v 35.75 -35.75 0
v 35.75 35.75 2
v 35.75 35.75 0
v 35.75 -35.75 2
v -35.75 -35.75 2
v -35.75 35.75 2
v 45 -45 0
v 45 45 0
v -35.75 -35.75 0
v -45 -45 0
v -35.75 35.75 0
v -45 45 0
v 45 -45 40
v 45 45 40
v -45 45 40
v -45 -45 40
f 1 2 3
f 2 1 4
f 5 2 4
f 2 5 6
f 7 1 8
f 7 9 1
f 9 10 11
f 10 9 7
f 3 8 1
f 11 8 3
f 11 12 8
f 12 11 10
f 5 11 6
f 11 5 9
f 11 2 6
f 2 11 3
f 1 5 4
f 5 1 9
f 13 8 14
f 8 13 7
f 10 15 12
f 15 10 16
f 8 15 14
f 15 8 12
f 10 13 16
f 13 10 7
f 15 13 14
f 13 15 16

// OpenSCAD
// Built by bench/smallmodels/features/compiler.py from a list of features.
$fn = 64;
difference() {
  union() {
    translate([0, 0, 0]) translate([-45, -45, 0]) cube([90, 90, 2]);
  }
  union() {
    translate([0, 0, 0]) rotate([0, 0, 0]) translate([-35.75, -35.75, 0]) cube([71.5, 71.5, 2]);
    translate([0, -177.5, 2]) rotate([0, 0, 0]) translate([-45, -1.25, 0]) cube([90, 2.5, 38]);
    translate([0, -87.5, 2]) rotate([0, 0, 0]) translate([-45, -1.25, 0]) cube([90, 2.5, 38]);
    translate([0, 2.5, 2]) rotate([0, 0, 0]) translate([-45, -1.25, 0]) cube([90, 2.5, 38]);
    translate([0, 92.5, 2]) rotate([0, 0, 0]) translate([-45, -1.25, 0]) cube([90, 2.5, 38]);
    translate([-177.5, 0, 2]) rotate([0, 0, 0]) translate([-1.25, -45, 0]) cube([2.5, 90, 38]);
    translate([-87.5, 0, 2]) rotate([0, 0, 0]) translate([-1.25, -45, 0]) cube([2.5, 90, 38]);
    translate([2.5, 0, 2]) rotate([0, 0, 0]) translate([-1.25, -45, 0]) cube([2.5, 90, 38]);
    translate([92.5, 0, 2]) rotate([0, 0, 0]) translate([-1.25, -45, 0]) cube([2.5, 90, 38]);
    translate([0, -177.5, 2]) rotate([0, 0, 0]) translate([-1.25, -45, 0]) cube([2.5, 90, 38]);
    translate([0, -87.5, 2]) rotate([0, 0, 0]) translate([-1.25, -45, 0]) cube([2.5, 90, 38]);
    translate([0, 2.5, 2]) rotate([0, 0, 0]) translate([-1.25, -45, 0]) cube([2.5, 90, 38]);
    translate([0, 92.5, 2]) rotate([0, 0, 0]) translate([-1.25, -45, 0]) cube([2.5, 90, 38]);
    translate([0, -92.5, 2]) rotate([0, 0, 0]) translate([-1.25, -45, 0]) cube([2.5, 90, 38]);
    translate([0, -2.5, 2]) rotate([0, 0, 0]) translate([-1.25, -45, 0]) cube([2.5, 90, 38]);
    translate([0, 87.5, 2]) rotate([0, 0, 0]) translate([-1.25, -45, 0]) cube([2.5, 90, 38]);
    translate([0, 177.5, 2]) rotate([0, 0, 0]) translate([-1.25, -45, 0]) cube([2.5, 90, 38]);
  }
}
union() {
    translate([0, 0, 2]) translate([-45, -45, 0]) cube([90, 90, 38]);
  }
